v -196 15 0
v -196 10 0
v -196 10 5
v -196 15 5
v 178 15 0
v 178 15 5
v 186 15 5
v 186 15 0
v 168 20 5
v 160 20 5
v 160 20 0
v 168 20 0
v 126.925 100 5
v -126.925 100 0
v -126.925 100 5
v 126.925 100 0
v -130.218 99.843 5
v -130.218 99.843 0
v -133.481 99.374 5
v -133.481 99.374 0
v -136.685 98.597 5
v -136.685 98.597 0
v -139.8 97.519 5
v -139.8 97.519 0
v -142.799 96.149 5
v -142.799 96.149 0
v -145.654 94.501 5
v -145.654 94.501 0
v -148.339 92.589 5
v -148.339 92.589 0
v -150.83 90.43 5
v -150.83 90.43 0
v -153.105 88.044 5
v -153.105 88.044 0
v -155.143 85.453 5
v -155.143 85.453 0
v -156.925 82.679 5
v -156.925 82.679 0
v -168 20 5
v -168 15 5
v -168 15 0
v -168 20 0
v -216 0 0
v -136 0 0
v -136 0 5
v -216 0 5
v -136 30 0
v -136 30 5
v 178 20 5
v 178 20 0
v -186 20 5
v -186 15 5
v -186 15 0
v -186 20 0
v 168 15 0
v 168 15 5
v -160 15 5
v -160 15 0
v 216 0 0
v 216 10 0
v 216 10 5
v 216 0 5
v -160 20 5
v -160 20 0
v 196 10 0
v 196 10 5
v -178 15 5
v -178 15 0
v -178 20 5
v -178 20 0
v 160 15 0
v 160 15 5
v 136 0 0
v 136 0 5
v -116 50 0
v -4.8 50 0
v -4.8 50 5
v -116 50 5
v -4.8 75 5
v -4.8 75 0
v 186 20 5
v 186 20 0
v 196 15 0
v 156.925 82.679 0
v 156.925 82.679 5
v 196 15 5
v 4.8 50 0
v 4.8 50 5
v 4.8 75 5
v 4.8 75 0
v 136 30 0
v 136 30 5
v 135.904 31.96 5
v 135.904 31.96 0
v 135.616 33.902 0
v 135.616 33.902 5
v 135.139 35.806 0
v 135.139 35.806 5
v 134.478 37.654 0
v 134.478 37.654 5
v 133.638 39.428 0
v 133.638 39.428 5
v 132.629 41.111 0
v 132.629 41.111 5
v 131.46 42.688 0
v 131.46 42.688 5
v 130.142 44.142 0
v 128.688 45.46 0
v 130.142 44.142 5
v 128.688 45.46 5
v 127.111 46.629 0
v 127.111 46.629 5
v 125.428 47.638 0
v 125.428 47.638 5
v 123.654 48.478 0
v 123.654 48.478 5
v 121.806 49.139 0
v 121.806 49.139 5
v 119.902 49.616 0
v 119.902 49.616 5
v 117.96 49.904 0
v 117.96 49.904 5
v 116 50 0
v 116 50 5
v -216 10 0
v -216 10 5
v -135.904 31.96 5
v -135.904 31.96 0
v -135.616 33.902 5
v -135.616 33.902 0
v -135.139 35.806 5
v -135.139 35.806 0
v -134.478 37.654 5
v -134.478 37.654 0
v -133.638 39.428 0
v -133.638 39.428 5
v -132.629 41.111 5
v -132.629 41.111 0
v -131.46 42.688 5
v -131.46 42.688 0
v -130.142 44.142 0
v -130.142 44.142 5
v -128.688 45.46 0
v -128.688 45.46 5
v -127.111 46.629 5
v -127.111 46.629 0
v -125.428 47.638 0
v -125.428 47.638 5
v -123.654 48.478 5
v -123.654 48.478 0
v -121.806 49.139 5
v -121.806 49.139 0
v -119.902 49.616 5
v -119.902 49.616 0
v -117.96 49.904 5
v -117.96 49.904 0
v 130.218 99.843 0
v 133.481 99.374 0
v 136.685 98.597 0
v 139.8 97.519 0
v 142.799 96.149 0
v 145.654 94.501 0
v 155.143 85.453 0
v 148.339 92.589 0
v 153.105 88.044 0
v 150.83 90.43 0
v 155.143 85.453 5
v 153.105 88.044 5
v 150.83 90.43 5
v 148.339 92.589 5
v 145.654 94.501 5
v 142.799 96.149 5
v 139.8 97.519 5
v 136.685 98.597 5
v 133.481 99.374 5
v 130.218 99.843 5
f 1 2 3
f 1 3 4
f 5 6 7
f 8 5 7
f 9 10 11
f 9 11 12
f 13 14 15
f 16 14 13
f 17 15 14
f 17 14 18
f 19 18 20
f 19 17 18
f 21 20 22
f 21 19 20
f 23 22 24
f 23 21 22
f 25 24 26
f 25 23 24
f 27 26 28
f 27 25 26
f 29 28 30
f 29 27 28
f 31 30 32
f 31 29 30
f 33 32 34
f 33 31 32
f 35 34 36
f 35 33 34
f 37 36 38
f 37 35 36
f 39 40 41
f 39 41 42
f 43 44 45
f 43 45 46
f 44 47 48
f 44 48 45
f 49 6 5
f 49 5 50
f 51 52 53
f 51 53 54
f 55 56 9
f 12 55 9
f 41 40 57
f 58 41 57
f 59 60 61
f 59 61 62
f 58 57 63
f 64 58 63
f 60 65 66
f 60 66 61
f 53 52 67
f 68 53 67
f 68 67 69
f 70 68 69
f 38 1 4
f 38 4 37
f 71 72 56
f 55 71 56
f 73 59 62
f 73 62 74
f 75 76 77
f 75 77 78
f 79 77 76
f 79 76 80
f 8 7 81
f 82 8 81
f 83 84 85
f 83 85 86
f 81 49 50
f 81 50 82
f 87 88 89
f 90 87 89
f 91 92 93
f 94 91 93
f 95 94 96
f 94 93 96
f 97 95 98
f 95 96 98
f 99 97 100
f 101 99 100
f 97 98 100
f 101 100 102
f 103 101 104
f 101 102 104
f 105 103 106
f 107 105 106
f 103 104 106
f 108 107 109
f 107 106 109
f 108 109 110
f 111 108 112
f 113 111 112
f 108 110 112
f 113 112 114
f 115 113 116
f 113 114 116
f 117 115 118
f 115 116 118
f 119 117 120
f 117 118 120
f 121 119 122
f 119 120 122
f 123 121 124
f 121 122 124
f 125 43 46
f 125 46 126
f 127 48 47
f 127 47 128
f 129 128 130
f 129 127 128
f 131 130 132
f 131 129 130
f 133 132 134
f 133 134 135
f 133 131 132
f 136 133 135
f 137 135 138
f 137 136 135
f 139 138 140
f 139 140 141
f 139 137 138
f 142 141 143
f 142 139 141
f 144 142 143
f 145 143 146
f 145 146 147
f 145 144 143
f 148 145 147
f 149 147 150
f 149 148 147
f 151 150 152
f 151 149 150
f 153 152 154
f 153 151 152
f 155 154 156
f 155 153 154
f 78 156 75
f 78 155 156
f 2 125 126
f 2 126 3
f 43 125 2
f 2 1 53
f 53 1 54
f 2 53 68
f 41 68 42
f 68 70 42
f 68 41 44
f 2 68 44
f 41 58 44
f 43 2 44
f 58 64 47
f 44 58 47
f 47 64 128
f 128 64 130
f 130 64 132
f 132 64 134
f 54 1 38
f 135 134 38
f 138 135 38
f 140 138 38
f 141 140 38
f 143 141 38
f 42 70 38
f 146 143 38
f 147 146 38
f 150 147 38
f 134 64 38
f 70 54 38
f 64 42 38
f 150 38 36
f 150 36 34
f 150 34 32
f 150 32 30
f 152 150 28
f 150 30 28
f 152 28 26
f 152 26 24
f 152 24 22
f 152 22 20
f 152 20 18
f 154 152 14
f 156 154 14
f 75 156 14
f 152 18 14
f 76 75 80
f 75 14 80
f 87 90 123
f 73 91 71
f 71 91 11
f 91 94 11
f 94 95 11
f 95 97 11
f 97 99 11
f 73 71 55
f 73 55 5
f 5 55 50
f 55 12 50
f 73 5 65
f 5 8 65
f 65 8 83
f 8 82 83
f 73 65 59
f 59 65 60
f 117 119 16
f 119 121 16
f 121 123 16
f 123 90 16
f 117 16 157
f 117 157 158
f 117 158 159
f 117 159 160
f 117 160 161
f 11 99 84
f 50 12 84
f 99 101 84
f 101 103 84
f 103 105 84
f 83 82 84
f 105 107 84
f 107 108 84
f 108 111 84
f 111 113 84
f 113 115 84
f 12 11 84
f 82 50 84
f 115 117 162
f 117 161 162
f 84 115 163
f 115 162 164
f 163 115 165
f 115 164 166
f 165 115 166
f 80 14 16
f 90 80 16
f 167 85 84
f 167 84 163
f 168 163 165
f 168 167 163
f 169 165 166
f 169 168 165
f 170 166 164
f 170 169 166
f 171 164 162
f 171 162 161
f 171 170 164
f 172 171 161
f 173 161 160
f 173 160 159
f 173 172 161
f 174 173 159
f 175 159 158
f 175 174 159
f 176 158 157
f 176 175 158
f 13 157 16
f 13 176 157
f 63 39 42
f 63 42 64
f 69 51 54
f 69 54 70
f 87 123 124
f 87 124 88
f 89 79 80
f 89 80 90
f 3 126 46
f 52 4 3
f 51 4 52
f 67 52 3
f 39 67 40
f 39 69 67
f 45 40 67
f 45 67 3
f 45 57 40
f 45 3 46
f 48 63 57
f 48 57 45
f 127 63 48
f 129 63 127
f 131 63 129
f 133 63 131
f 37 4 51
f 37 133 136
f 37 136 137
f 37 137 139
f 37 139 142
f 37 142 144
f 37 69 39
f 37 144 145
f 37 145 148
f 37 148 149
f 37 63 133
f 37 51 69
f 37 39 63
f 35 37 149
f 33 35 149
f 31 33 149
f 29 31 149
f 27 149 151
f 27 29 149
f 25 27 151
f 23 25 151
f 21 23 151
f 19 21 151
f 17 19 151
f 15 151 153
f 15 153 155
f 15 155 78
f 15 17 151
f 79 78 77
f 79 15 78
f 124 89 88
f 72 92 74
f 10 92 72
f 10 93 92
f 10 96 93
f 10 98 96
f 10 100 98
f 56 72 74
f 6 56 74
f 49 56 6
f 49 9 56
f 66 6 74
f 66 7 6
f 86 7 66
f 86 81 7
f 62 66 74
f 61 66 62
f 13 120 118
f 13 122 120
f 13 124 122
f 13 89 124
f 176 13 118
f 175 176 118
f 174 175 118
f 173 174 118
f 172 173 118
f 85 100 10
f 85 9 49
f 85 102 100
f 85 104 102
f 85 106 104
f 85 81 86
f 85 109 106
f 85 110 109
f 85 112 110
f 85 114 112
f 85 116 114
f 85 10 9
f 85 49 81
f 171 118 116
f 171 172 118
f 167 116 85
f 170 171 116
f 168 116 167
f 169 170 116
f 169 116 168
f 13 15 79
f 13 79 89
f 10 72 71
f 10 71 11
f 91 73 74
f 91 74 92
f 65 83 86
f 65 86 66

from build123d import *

# Parameters (mm, degrees)
EXTRUDE_1_DEPTH     = 5
CUT_EXTRUDE_1_REACH = 7
EXTRUDE_2_DEPTH     = 5
CUT_EXTRUDE_2_REACH = 7
SKETCH_4_W          = 9.6
SKETCH_4_H          = 50
CUT_EXTRUDE_3_REACH = 7
SKETCH_5_W          = 8
SKETCH_5_H          = 5


with BuildPart() as part:
    # 草图1 → 凸台-拉伸1 (new body)
    with BuildSketch(Plane.XY):
        Polygon((-216, 0), (-216, 10), (-196, 10), (-196, 15), (-146.925227119, 100), (146.925227119, 100), (196, 15), (196, 10), (216, 10), (216, 0), (136, 0), (136, 50), (-136, 50), (-136, 0), align=None)
    extrude(amount=EXTRUDE_1_DEPTH)

    # 草图2 → 切除-拉伸1 (cut, up to next)
    with BuildSketch(Plane.XY.offset(5), mode=Mode.PRIVATE) as cut_extrude_1_sk1:
        with BuildLine():
            Line((-146.925227119, 100), (-126.925227119, 100))
            ThreePointArc((-126.925227119, 100), (-144.245735195, 95.358983849), (-156.925227119, 82.679491924))
            Line((-156.925227119, 82.679491924), (-146.925227119, 100))
        make_face()
    cut_extrude_1_tool1 = extrude(cut_extrude_1_sk1.sketch, amount=-CUT_EXTRUDE_1_REACH, mode=Mode.PRIVATE) & part.part
    add(cut_extrude_1_tool1.solids().sort_by_distance((-144.827064, 96.365874, 5))[0], mode=Mode.SUBTRACT)
    # 草图2 → 切除-拉伸1 (cut, up to next)
    with BuildSketch(Plane.XY.offset(5), mode=Mode.PRIVATE) as cut_extrude_1_sk2:
        with BuildLine():
            Line((146.925227119, 100), (156.925227119, 82.679491924))
            ThreePointArc((156.925227119, 82.679491924), (144.245735195, 95.358983849), (126.925227119, 100))
            Line((126.925227119, 100), (146.925227119, 100))
        make_face()
    cut_extrude_1_tool2 = extrude(cut_extrude_1_sk2.sketch, amount=-CUT_EXTRUDE_1_REACH, mode=Mode.PRIVATE) & part.part
    add(cut_extrude_1_tool2.solids().sort_by_distance((144.827064, 96.365874, 5))[0], mode=Mode.SUBTRACT)

    # 草图3 → 凸台-拉伸2 (add)
    with BuildSketch(Plane.XY.offset(5)):
        with BuildLine():
            Line((-116, 50), (-136, 50))
            Line((-136, 50), (-136, 30))
            ThreePointArc((-136, 30), (-130.142135624, 44.142135624), (-116, 50))
        make_face()
        with BuildLine():
            Line((136, 50), (136, 30))
            ThreePointArc((136, 30), (130.142135624, 44.142135624), (116, 50))
            Line((116, 50), (136, 50))
        make_face()
    extrude(amount=-EXTRUDE_2_DEPTH)

    # 草图4 → 切除-拉伸2 (cut, up to next)
    with BuildSketch(Plane.XY.offset(5), mode=Mode.PRIVATE) as cut_extrude_2_sk1:
        with Locations((0, 50)):
            Rectangle(SKETCH_4_W, SKETCH_4_H)
    cut_extrude_2_tool1 = extrude(cut_extrude_2_sk1.sketch, amount=-CUT_EXTRUDE_2_REACH, mode=Mode.PRIVATE) & part.part
    add(cut_extrude_2_tool1.solids().sort_by_distance((0, 50, 5))[0], mode=Mode.SUBTRACT)

    # 草图5 → 切除-拉伸3 (cut, up to next)
    with BuildSketch(Plane.XY.offset(5), mode=Mode.PRIVATE) as cut_extrude_3_sk1:
        with Locations((-182, 17.5)):
            Rectangle(SKETCH_5_W, SKETCH_5_H)
    cut_extrude_3_tool1 = extrude(cut_extrude_3_sk1.sketch, amount=-CUT_EXTRUDE_3_REACH, mode=Mode.PRIVATE) & part.part
    add(cut_extrude_3_tool1.solids().sort_by_distance((-182, 17.5, 5))[0], mode=Mode.SUBTRACT)
    # 草图5 → 切除-拉伸3 (cut, up to next)
    with BuildSketch(Plane.XY.offset(5), mode=Mode.PRIVATE) as cut_extrude_3_sk2:
        with Locations((-164, 17.5)):
            Rectangle(SKETCH_5_W, SKETCH_5_H)
    cut_extrude_3_tool2 = extrude(cut_extrude_3_sk2.sketch, amount=-CUT_EXTRUDE_3_REACH, mode=Mode.PRIVATE) & part.part
    add(cut_extrude_3_tool2.solids().sort_by_distance((-164, 17.5, 5))[0], mode=Mode.SUBTRACT)
    # 草图5 → 切除-拉伸3 (cut, up to next)
    with BuildSketch(Plane.XY.offset(5), mode=Mode.PRIVATE) as cut_extrude_3_sk3:
        with Locations((164, 17.5)):
            Rectangle(SKETCH_5_W, SKETCH_5_H)
    cut_extrude_3_tool3 = extrude(cut_extrude_3_sk3.sketch, amount=-CUT_EXTRUDE_3_REACH, mode=Mode.PRIVATE) & part.part
    add(cut_extrude_3_tool3.solids().sort_by_distance((164, 17.5, 5))[0], mode=Mode.SUBTRACT)
    # 草图5 → 切除-拉伸3 (cut, up to next)
    with BuildSketch(Plane.XY.offset(5), mode=Mode.PRIVATE) as cut_extrude_3_sk4:
        with Locations((182, 17.5)):
            Rectangle(SKETCH_5_W, SKETCH_5_H)
    cut_extrude_3_tool4 = extrude(cut_extrude_3_sk4.sketch, amount=-CUT_EXTRUDE_3_REACH, mode=Mode.PRIVATE) & part.part
    add(cut_extrude_3_tool4.solids().sort_by_distance((182, 17.5, 5))[0], mode=Mode.SUBTRACT)


solid = part.part
